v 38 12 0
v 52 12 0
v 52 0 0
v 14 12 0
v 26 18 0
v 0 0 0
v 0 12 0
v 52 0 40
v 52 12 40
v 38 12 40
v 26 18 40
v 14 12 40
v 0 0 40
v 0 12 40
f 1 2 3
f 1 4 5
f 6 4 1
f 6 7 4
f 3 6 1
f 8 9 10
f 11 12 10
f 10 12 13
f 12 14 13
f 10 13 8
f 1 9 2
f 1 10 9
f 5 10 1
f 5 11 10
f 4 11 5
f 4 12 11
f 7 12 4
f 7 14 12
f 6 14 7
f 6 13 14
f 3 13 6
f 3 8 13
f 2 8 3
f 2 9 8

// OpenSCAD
$fn = 32;

// ----------------------------------------------------------------------
// V guide rail: vrib, 52 mm wide
// ----------------------------------------------------------------------

// --- parameters (mm) ---
rail_w = 52;              // rail width, X
base_t = 12;              // base plate thickness
v_depth = 6;              // V feature depth / height
v_half_w = 12;            // half width of the V at the base face
plate_t = 40;             // rail length, Z (the extrusion height)

profile = [[0, 0], [52, 0], [52, 12], [38, 12], [26, 18], [14, 12], [0, 12]];  // primary outline, 7 points, counter clockwise

// --- the one profile operation ---
linear_extrude(height = plate_t) polygon(points = profile);
